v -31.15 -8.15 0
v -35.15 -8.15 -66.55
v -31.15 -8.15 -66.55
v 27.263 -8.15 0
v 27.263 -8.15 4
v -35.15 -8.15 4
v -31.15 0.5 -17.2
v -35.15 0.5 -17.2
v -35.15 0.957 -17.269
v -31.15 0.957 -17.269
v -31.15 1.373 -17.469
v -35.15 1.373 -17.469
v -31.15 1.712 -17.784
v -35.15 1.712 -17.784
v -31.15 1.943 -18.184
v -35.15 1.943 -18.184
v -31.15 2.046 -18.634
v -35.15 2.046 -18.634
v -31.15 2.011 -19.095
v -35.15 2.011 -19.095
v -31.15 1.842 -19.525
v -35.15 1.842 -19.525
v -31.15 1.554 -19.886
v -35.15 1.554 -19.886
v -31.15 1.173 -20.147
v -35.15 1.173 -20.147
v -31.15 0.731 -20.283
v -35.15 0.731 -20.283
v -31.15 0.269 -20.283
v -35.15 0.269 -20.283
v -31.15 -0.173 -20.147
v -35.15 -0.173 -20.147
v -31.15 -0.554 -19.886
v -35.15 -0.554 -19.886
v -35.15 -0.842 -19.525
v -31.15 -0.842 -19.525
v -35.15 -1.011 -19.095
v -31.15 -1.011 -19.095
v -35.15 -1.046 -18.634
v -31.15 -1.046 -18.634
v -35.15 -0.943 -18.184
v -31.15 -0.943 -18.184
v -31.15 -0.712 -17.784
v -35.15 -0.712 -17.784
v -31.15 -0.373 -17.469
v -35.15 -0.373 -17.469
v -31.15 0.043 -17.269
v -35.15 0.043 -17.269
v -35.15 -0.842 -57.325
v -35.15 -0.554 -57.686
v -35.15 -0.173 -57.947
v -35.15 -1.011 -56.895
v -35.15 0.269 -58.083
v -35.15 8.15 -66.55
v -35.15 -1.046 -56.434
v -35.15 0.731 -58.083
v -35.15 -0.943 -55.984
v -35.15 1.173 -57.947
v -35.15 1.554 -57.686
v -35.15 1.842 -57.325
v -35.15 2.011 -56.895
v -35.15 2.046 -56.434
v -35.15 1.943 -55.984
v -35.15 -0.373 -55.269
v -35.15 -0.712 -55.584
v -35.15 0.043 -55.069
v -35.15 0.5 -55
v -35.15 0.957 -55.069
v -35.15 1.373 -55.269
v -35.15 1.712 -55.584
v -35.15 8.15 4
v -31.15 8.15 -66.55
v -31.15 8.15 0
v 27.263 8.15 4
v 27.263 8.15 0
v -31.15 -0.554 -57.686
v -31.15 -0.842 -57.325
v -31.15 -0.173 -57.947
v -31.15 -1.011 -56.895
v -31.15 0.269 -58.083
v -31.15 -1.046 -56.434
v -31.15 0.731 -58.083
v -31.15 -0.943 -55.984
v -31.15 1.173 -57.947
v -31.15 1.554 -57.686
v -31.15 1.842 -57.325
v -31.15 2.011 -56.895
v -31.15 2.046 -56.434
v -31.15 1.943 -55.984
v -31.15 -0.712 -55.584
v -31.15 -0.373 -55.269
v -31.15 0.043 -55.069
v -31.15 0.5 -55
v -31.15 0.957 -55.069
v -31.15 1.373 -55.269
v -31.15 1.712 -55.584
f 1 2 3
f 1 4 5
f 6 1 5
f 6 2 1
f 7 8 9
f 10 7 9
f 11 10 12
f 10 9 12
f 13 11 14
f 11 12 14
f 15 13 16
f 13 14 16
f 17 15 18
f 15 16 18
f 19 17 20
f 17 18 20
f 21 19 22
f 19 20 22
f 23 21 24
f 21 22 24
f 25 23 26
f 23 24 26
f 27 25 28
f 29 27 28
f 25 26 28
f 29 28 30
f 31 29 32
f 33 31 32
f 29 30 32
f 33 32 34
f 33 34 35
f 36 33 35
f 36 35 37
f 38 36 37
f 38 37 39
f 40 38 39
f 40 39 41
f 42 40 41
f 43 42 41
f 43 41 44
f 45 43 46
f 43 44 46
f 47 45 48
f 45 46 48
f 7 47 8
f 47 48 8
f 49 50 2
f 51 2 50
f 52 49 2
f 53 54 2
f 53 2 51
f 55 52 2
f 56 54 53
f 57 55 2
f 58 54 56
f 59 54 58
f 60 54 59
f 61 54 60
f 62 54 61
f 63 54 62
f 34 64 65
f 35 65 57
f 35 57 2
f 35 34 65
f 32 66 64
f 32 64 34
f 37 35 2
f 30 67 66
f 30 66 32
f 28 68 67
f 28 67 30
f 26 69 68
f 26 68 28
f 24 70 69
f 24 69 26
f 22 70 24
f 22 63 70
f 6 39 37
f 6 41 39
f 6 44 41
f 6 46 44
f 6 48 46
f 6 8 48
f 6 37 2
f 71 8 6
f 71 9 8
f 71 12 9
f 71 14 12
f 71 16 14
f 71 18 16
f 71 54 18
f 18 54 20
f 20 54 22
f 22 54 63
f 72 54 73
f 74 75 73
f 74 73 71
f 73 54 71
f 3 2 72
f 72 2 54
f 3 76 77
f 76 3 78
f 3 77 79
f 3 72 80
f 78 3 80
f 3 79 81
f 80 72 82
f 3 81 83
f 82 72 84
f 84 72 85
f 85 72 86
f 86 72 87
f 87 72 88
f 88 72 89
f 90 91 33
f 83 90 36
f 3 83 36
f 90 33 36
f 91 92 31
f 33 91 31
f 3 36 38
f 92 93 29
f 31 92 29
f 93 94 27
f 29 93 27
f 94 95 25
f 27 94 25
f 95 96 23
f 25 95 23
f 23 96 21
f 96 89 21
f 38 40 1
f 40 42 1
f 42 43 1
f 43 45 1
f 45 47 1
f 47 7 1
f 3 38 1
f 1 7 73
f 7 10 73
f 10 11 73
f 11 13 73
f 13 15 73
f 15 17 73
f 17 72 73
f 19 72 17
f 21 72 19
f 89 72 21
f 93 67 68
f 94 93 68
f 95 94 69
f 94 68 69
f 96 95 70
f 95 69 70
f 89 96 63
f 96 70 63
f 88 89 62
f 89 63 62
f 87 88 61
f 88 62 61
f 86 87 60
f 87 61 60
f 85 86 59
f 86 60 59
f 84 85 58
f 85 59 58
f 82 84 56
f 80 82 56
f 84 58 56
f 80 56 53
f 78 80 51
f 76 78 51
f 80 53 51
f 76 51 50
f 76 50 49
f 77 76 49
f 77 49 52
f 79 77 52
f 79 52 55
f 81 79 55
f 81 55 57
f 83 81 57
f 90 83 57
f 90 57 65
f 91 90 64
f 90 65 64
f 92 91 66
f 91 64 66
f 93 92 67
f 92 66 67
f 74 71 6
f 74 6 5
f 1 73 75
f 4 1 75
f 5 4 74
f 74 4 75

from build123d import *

# Parameters (mm, degrees)
SKETCH_1_W      = 62.4134
SKETCH_1_H      = 16.3
EXTRUDE_1_DEPTH = 4
SKETCH_3_W      = 70.55
SKETCH_3_H      = 16.3
SKETCH_3_R      = 1.55
EXTRUDE_3_DEPTH = 4


with BuildPart() as part:
    # 草图1 → 凸台-拉伸1 (new body)
    with BuildSketch(Plane.XY):
        with Locations((-3.9433, 0)):
            Rectangle(SKETCH_1_W, SKETCH_1_H)
    extrude(amount=EXTRUDE_1_DEPTH)

    # 草图3 → 凸台-拉伸3 (add)
    with BuildSketch(Plane.ZY.offset(35.15)):
        with Locations((-31.275, 0)):
            Rectangle(SKETCH_3_W, SKETCH_3_H)
        with Locations((-56.55, 0.5)):
            Circle(SKETCH_3_R, mode=Mode.SUBTRACT)
        with Locations((-18.75, 0.5)):
            Circle(SKETCH_3_R, mode=Mode.SUBTRACT)
    extrude(amount=-EXTRUDE_3_DEPTH)


solid = part.part
